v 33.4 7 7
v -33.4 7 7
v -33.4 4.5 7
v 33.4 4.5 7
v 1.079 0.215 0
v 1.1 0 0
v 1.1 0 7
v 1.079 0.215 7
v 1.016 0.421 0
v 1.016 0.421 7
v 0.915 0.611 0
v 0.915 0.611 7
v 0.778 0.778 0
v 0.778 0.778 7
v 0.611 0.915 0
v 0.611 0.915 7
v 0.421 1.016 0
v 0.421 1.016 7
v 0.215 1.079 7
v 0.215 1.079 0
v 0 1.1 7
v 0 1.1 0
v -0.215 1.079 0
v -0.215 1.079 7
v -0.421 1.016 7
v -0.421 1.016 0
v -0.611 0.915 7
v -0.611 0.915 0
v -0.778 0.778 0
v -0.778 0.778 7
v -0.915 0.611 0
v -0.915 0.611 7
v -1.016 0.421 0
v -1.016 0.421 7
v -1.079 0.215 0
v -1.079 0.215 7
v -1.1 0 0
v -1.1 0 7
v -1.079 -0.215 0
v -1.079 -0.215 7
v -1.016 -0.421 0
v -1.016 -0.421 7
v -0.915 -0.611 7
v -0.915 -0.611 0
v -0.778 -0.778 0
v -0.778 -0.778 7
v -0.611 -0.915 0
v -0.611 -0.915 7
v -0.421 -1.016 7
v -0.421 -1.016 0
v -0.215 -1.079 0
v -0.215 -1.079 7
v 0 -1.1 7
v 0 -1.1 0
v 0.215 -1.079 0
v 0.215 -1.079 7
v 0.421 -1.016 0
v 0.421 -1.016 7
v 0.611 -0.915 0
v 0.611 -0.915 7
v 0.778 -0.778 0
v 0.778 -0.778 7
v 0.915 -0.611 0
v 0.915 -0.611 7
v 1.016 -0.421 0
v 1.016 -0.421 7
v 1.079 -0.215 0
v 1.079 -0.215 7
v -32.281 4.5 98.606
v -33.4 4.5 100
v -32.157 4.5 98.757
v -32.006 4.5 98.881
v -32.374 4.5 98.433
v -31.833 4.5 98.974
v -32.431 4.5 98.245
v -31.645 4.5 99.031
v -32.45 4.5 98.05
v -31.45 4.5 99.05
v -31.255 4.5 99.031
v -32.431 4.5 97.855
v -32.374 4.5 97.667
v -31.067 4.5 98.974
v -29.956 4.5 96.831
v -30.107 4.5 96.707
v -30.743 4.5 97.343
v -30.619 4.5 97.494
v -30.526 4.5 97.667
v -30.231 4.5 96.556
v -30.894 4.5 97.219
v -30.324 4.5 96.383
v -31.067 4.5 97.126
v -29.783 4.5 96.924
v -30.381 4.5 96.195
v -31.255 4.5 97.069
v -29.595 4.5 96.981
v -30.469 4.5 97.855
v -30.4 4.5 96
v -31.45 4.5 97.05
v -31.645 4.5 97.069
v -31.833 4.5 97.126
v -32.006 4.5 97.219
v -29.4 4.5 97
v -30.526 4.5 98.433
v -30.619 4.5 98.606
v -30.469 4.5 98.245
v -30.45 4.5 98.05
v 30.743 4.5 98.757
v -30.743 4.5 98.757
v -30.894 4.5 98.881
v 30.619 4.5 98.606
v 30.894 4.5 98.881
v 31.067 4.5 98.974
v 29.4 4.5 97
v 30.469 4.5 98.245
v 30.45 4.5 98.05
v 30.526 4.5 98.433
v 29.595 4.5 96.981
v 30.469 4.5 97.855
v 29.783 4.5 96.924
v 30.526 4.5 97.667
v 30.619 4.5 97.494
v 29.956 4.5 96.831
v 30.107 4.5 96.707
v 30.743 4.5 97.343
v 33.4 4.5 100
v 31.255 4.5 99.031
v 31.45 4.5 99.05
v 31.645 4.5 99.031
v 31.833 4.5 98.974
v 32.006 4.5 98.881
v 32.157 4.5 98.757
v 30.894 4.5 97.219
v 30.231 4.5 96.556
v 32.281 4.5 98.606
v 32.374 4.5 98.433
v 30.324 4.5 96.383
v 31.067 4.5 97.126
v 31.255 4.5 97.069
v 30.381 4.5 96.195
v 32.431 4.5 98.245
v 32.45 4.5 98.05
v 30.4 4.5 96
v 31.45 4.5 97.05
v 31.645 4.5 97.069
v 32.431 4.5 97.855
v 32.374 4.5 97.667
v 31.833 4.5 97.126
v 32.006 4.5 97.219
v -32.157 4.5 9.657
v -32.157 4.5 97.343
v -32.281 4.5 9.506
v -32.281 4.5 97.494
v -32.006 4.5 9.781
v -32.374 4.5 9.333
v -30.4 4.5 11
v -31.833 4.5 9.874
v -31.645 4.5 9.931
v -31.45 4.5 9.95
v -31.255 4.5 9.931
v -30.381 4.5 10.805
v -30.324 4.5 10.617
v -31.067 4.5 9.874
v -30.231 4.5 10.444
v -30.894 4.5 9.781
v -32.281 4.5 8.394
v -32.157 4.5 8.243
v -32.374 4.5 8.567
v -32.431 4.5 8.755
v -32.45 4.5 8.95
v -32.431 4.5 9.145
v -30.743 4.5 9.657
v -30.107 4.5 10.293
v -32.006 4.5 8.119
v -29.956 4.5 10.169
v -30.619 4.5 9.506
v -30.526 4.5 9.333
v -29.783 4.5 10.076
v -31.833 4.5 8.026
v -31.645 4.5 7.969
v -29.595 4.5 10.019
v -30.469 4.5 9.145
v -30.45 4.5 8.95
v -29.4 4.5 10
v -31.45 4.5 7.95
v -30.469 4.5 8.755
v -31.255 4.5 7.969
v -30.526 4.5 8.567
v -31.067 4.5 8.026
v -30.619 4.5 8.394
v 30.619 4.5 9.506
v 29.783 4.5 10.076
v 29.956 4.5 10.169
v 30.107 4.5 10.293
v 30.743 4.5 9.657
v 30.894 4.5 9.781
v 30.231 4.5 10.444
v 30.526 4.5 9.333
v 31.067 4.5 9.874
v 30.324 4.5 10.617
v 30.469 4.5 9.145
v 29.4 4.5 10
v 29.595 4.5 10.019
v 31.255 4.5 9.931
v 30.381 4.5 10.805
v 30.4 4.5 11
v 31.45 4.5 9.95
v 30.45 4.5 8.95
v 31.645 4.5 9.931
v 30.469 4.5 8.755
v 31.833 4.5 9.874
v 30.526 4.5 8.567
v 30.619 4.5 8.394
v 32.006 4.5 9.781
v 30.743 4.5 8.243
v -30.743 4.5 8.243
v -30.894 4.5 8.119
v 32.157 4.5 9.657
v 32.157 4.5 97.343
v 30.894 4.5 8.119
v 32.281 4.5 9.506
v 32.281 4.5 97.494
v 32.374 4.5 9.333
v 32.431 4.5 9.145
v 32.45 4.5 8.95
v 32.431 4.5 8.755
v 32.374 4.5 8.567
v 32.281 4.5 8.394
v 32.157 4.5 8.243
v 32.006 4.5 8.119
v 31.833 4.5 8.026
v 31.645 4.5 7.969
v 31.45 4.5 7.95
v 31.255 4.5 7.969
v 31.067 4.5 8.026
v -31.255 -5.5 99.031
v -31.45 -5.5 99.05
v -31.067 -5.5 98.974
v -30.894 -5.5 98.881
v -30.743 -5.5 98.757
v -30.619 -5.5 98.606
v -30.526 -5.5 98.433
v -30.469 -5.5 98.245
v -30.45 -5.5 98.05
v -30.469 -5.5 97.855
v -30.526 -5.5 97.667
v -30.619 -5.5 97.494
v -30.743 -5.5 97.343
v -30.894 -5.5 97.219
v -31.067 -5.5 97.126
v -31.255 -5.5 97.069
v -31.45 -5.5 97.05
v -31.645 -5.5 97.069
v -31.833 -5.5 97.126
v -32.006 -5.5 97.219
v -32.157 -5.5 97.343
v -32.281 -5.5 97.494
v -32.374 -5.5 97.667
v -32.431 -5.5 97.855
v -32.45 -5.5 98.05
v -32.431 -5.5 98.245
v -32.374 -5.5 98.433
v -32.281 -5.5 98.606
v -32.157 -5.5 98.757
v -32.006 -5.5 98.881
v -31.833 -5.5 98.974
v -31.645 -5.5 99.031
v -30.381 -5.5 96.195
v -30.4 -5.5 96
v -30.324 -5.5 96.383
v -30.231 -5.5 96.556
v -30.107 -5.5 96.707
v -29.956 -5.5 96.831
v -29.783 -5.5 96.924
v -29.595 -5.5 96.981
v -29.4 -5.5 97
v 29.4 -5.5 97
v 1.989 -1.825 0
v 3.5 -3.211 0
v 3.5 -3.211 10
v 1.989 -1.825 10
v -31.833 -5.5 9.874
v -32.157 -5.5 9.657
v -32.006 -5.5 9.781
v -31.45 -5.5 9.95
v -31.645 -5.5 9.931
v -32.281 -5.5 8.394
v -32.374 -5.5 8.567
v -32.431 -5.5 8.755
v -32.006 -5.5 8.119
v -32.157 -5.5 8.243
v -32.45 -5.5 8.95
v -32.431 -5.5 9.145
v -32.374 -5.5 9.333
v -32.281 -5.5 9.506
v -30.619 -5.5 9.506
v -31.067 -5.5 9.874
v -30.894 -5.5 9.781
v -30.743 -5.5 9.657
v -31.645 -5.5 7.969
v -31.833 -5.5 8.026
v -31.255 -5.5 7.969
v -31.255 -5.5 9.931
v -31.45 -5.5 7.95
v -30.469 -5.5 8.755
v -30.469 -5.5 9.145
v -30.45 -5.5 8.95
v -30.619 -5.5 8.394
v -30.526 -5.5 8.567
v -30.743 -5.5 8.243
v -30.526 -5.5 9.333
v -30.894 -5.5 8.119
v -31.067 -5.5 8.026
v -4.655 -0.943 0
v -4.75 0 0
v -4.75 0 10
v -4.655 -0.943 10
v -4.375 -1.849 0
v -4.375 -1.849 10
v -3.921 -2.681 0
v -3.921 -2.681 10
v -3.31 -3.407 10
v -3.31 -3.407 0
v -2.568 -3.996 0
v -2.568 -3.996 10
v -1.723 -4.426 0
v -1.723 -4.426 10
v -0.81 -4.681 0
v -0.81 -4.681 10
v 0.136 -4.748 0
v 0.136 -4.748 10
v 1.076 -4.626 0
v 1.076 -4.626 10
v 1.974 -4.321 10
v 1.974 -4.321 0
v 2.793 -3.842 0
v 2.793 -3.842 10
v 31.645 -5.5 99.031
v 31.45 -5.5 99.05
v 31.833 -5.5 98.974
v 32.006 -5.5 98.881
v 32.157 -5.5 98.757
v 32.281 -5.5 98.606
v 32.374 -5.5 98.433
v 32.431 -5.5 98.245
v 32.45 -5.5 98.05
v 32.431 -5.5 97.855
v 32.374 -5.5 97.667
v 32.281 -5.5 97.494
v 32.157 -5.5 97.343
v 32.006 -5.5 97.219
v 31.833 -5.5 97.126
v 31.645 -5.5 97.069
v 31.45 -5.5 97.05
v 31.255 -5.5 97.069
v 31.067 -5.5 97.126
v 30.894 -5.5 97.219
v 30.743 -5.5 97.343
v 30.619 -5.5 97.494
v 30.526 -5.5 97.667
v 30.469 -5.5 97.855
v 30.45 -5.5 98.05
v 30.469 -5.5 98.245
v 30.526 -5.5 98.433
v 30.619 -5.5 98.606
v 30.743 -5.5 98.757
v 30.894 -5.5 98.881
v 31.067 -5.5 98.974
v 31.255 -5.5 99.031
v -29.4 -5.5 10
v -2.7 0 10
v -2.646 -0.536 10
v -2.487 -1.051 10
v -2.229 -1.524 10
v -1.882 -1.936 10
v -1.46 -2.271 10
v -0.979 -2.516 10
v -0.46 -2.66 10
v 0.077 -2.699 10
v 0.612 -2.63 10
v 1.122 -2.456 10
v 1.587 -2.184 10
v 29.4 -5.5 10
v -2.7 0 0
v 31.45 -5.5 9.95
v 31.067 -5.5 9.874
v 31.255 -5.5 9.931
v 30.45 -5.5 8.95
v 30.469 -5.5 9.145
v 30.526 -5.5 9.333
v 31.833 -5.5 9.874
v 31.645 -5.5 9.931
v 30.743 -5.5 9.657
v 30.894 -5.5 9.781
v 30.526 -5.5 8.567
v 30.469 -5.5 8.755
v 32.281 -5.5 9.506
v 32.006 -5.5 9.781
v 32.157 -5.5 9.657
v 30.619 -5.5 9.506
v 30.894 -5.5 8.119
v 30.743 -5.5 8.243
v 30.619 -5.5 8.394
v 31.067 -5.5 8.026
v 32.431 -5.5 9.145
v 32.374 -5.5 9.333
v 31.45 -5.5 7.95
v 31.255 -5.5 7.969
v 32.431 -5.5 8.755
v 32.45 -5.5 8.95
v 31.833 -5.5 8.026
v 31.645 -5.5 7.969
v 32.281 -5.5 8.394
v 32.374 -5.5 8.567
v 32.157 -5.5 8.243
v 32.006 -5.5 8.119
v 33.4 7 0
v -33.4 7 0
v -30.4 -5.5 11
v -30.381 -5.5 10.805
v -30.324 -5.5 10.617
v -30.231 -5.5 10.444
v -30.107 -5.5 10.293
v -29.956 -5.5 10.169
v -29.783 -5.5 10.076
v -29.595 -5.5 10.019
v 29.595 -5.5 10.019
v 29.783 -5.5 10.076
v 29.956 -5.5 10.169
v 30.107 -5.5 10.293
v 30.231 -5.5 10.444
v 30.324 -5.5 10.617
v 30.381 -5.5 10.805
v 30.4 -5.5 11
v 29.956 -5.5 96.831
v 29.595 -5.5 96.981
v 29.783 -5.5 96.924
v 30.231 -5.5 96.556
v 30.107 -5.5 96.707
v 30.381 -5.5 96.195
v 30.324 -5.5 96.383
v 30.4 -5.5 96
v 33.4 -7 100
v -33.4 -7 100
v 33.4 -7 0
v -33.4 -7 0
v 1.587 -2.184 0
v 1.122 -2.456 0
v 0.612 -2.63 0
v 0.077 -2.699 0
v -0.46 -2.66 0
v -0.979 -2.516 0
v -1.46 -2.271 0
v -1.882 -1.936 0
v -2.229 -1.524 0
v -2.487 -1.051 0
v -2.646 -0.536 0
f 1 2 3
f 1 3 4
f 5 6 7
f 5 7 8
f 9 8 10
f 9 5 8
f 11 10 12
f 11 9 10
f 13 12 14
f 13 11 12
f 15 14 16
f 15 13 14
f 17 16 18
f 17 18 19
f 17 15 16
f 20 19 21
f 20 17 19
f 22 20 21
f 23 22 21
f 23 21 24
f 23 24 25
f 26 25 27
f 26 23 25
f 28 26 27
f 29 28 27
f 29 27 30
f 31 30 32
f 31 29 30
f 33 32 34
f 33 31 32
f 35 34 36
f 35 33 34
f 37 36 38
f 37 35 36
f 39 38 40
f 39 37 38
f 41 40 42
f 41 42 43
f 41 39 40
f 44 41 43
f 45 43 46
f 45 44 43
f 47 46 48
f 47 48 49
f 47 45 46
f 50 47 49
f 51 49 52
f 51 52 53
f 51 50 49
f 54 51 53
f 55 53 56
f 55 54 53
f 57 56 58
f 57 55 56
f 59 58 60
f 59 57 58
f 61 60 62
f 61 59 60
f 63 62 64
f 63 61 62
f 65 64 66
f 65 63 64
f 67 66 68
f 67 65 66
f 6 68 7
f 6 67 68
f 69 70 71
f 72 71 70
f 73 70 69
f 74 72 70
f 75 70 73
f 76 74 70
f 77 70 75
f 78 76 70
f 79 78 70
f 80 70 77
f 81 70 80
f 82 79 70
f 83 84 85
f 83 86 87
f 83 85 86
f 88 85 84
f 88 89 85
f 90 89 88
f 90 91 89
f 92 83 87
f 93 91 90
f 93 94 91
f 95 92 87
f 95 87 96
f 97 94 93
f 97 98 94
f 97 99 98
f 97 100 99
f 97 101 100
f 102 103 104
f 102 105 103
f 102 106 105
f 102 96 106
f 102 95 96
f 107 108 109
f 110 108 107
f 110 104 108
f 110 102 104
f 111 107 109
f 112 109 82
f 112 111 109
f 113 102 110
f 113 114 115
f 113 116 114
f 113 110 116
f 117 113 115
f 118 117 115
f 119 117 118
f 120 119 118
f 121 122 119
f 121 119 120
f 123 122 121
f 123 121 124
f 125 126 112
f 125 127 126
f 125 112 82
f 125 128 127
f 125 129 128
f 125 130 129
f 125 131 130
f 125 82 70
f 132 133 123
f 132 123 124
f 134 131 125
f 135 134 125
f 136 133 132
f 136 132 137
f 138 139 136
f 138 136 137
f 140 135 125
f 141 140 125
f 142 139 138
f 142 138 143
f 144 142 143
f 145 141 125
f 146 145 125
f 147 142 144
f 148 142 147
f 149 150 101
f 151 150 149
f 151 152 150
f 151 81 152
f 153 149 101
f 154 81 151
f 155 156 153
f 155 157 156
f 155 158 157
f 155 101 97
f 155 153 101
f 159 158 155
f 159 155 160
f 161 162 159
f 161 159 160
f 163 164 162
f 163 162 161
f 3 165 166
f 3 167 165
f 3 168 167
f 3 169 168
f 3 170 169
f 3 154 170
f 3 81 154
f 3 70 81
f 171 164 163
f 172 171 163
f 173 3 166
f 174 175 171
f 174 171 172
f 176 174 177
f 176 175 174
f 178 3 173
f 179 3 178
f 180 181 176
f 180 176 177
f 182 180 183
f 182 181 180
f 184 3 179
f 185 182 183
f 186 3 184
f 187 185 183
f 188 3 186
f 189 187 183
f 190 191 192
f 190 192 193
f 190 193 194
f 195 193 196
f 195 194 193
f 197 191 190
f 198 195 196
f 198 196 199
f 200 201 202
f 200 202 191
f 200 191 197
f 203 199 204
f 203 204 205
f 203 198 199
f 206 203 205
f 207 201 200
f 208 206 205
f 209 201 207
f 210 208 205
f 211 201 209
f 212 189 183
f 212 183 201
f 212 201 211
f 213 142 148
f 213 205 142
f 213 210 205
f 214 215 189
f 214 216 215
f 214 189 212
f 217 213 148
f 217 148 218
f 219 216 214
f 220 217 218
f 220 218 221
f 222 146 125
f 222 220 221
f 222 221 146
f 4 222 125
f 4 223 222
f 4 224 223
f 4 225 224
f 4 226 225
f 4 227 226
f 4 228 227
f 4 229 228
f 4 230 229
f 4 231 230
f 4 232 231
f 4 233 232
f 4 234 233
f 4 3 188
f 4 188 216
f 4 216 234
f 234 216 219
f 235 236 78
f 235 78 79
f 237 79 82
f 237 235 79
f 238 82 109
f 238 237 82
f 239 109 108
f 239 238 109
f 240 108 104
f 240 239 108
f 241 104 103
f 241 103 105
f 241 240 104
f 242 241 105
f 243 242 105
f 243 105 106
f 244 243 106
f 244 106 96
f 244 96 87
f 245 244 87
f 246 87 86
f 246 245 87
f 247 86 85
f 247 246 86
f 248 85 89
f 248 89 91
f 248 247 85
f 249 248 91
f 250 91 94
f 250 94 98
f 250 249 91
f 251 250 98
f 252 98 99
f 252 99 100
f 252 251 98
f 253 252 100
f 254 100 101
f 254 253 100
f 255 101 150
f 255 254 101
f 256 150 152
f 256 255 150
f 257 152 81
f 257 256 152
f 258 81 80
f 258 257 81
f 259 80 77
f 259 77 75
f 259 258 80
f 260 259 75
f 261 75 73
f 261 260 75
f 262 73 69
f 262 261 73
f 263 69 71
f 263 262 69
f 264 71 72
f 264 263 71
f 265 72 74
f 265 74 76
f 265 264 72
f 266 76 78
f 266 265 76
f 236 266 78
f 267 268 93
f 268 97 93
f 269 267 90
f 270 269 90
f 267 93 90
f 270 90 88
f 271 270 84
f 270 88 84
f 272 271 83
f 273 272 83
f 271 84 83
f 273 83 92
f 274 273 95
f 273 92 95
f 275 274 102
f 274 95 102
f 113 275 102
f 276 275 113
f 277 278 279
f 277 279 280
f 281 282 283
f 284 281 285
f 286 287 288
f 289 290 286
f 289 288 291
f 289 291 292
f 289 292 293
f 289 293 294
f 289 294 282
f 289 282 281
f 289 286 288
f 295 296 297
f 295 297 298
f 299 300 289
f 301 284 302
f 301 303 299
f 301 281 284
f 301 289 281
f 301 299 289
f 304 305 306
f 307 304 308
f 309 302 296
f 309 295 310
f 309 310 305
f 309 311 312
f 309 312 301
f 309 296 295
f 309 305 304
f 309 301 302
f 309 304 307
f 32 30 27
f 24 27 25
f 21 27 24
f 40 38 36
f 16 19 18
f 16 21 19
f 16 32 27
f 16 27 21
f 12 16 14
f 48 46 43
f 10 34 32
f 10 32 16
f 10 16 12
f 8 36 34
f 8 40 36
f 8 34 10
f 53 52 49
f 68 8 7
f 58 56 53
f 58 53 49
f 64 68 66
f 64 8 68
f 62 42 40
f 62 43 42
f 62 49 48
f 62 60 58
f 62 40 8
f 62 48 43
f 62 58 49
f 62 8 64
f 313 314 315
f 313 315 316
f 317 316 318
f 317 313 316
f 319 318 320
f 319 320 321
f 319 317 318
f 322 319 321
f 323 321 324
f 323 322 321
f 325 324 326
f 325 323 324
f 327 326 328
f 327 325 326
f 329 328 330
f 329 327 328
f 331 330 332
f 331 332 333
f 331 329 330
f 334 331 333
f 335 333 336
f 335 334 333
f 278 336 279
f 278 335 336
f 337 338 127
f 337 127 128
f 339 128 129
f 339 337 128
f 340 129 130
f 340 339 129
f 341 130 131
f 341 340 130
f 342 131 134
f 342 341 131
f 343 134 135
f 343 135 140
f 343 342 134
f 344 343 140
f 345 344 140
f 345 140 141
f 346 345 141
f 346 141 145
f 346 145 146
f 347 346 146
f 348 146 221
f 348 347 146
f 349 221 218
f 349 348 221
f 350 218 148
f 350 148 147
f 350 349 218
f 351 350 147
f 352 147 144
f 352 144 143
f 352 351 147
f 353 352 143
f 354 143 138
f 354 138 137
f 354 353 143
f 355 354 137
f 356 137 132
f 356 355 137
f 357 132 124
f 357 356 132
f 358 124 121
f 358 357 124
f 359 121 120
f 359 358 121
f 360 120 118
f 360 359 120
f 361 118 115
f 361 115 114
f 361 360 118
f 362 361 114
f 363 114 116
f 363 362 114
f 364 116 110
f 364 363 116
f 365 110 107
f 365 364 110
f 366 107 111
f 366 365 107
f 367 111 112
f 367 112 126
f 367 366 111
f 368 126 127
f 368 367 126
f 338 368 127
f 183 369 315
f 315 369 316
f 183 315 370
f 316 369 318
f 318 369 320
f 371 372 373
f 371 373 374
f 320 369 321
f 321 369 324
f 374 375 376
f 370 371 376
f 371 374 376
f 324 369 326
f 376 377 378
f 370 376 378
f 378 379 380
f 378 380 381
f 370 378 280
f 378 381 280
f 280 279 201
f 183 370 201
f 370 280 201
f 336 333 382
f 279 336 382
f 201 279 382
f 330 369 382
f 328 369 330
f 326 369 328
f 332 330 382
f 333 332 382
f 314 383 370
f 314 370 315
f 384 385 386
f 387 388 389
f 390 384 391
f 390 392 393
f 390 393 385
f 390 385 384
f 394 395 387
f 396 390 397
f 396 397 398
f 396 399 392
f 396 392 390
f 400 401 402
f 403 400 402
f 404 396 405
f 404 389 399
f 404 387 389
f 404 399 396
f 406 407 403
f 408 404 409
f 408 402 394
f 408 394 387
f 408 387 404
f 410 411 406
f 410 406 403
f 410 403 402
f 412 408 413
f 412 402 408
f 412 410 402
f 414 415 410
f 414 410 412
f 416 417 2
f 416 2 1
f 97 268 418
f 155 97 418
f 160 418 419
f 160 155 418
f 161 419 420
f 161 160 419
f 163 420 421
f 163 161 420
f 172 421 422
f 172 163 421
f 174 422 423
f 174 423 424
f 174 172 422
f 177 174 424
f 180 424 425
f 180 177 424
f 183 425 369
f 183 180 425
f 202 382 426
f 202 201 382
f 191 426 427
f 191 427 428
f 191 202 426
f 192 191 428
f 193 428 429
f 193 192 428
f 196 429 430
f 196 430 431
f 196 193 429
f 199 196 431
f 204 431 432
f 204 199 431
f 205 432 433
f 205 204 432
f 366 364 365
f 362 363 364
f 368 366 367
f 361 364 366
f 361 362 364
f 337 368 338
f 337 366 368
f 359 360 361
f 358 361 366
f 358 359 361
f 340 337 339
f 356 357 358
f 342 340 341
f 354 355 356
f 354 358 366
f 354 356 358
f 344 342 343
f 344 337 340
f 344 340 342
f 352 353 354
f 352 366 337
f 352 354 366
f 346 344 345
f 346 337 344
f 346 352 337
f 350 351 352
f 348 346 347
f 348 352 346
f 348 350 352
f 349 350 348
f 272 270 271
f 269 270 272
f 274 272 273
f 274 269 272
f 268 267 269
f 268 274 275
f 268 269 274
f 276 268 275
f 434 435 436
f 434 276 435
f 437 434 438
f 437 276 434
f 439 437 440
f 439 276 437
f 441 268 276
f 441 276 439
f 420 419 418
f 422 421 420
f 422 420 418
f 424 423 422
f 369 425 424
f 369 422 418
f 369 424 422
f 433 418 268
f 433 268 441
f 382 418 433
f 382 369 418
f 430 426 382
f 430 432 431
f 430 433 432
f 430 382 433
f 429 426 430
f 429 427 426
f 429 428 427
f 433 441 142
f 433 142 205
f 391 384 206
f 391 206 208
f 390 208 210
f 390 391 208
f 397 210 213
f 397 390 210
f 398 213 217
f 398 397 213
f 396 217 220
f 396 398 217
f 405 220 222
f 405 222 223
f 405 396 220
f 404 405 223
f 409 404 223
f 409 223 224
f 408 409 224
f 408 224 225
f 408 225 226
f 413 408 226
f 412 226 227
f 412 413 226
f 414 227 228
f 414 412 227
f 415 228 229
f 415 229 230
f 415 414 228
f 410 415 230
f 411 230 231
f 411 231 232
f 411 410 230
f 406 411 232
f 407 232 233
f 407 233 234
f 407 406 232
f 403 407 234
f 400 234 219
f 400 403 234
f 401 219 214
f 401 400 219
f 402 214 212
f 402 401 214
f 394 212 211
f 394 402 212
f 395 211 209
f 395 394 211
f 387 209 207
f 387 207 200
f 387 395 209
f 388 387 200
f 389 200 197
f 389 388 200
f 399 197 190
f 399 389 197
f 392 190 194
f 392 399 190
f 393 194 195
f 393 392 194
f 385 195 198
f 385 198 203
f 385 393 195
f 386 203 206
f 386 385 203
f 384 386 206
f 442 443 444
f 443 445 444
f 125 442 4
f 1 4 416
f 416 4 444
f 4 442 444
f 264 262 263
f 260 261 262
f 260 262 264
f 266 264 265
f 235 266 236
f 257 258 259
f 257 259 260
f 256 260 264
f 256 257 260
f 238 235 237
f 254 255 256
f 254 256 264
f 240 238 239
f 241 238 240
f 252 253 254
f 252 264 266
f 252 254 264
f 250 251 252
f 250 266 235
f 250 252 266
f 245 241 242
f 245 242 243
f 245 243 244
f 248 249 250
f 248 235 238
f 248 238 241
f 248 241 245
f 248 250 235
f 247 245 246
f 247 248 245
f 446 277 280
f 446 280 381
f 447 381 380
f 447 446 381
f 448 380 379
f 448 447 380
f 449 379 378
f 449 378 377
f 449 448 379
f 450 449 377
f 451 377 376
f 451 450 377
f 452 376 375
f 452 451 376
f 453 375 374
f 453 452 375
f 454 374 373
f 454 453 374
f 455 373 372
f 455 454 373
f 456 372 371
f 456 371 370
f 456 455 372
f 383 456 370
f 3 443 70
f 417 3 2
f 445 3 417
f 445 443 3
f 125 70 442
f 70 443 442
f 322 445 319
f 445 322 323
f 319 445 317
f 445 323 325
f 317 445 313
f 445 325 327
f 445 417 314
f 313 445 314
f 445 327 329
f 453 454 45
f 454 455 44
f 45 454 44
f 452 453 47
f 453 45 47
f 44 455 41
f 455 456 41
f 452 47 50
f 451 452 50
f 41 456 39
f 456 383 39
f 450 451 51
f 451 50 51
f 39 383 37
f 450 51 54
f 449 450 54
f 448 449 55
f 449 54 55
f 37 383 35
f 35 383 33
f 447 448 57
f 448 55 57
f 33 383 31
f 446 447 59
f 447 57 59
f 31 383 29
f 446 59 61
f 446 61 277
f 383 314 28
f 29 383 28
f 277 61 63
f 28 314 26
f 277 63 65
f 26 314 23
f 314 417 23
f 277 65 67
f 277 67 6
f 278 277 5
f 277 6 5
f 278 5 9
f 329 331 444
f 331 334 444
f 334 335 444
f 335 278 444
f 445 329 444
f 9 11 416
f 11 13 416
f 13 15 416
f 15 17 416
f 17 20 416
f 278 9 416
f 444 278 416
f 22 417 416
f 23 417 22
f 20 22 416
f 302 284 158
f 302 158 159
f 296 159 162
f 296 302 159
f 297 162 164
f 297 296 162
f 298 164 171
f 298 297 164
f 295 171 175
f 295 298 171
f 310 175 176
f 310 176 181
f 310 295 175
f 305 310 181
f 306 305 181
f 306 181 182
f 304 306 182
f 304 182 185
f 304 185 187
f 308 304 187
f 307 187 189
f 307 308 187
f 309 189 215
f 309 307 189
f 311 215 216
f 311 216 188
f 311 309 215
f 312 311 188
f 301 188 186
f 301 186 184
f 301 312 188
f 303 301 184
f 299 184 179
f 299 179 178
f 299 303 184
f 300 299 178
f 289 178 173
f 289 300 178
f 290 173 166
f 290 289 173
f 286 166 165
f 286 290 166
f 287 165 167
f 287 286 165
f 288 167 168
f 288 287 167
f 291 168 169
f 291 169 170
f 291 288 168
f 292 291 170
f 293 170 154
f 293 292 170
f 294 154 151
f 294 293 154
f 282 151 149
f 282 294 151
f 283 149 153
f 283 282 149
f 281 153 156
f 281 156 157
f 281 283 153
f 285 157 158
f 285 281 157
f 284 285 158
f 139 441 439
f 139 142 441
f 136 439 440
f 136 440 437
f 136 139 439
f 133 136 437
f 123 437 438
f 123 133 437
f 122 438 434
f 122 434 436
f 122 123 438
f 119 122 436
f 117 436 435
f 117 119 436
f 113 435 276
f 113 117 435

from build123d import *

# Parameters (mm, degrees)
SKETCH1_W           = 66.8
SKETCH1_H           = 14
SKETCH1_R           = 1.1
BOSS_EXTRUDE2_DEPTH = 7
SKETCH5_W           = 66.8
SKETCH5_H           = 1.5
BOSS_EXTRUDE3_DEPTH = 93
SKETCH6_W           = 66.8
SKETCH6_H           = 93
SKETCH6_R           = 1
SKETCH6_W_2         = 60.8
SKETCH6_H_2         = 87
BOSS_EXTRUDE4_DEPTH = 10
FILLET1_R           = 1
CUT_EXTRUDE1_DEPTH  = 10


with BuildPart() as part:
    # Sketch1 → Boss-Extrude2 (new body)
    with BuildSketch(Plane.XY):
        Rectangle(SKETCH1_W, SKETCH1_H)
        Circle(SKETCH1_R, mode=Mode.SUBTRACT)
    extrude(amount=BOSS_EXTRUDE2_DEPTH)

    # Sketch5 → Boss-Extrude3 (add)
    with BuildSketch(Plane.XY.offset(7)):
        with Locations((0, -6.25)):
            Rectangle(SKETCH5_W, SKETCH5_H)
    extrude(amount=BOSS_EXTRUDE3_DEPTH)

    # Sketch6 → Boss-Extrude4 (add)
    with BuildSketch(Plane(origin=(0, -5.5, 0), x_dir=(1, 0, 0), z_dir=(0, 1, 0))):
        with Locations((0, -53.5)):
            Rectangle(SKETCH6_W, SKETCH6_H)
        with Locations(Location((-31.45, -8.95, 0), (0, 0, 270))):
            Circle(SKETCH6_R, mode=Mode.SUBTRACT)
        with Locations(Location((31.45, -8.95, 0), (0, 0, 270))):
            Circle(SKETCH6_R, mode=Mode.SUBTRACT)
        with Locations(Location((31.45, -98.05, 0), (0, 0, 270))):
            Circle(SKETCH6_R, mode=Mode.SUBTRACT)
        with Locations(Location((-31.45, -98.05, 0), (0, 0, 270))):
            Circle(SKETCH6_R, mode=Mode.SUBTRACT)
        with Locations((0, -53.5)):
            Rectangle(SKETCH6_W_2, SKETCH6_H_2, mode=Mode.SUBTRACT)
    extrude(amount=BOSS_EXTRUDE4_DEPTH)

    # Fillet1
    fillet1_edges = [part.edges().sort_by_distance(p)[0] for p in [
        (30.4, -0.5, 97),
        (30.4, -0.5, 10),
        (-30.4, -0.5, 10),
        (-30.4, -0.5, 97),
    ]]
    fillet(fillet1_edges, radius=FILLET1_R)

    # Sketch2 → Cut-Extrude1 (cut)
    with BuildSketch(Plane(origin=(0, 0, 0), x_dir=(-1, 0, 0), z_dir=(0, 0, -1))):
        with BuildLine():
            Line((2.7, 0), (4.75, 0))
            ThreePointArc((4.75, 0), (1.723006094, -4.426482802), (-3.5, -3.211308145))
            Line((-3.5, -3.211308145), (-1.989473684, -1.825375156))
            ThreePointArc((-1.989473684, -1.825375156), (0.979392938, -2.516106014), (2.7, 0))
        make_face()
    extrude(amount=-CUT_EXTRUDE1_DEPTH, mode=Mode.SUBTRACT)


solid = part.part
